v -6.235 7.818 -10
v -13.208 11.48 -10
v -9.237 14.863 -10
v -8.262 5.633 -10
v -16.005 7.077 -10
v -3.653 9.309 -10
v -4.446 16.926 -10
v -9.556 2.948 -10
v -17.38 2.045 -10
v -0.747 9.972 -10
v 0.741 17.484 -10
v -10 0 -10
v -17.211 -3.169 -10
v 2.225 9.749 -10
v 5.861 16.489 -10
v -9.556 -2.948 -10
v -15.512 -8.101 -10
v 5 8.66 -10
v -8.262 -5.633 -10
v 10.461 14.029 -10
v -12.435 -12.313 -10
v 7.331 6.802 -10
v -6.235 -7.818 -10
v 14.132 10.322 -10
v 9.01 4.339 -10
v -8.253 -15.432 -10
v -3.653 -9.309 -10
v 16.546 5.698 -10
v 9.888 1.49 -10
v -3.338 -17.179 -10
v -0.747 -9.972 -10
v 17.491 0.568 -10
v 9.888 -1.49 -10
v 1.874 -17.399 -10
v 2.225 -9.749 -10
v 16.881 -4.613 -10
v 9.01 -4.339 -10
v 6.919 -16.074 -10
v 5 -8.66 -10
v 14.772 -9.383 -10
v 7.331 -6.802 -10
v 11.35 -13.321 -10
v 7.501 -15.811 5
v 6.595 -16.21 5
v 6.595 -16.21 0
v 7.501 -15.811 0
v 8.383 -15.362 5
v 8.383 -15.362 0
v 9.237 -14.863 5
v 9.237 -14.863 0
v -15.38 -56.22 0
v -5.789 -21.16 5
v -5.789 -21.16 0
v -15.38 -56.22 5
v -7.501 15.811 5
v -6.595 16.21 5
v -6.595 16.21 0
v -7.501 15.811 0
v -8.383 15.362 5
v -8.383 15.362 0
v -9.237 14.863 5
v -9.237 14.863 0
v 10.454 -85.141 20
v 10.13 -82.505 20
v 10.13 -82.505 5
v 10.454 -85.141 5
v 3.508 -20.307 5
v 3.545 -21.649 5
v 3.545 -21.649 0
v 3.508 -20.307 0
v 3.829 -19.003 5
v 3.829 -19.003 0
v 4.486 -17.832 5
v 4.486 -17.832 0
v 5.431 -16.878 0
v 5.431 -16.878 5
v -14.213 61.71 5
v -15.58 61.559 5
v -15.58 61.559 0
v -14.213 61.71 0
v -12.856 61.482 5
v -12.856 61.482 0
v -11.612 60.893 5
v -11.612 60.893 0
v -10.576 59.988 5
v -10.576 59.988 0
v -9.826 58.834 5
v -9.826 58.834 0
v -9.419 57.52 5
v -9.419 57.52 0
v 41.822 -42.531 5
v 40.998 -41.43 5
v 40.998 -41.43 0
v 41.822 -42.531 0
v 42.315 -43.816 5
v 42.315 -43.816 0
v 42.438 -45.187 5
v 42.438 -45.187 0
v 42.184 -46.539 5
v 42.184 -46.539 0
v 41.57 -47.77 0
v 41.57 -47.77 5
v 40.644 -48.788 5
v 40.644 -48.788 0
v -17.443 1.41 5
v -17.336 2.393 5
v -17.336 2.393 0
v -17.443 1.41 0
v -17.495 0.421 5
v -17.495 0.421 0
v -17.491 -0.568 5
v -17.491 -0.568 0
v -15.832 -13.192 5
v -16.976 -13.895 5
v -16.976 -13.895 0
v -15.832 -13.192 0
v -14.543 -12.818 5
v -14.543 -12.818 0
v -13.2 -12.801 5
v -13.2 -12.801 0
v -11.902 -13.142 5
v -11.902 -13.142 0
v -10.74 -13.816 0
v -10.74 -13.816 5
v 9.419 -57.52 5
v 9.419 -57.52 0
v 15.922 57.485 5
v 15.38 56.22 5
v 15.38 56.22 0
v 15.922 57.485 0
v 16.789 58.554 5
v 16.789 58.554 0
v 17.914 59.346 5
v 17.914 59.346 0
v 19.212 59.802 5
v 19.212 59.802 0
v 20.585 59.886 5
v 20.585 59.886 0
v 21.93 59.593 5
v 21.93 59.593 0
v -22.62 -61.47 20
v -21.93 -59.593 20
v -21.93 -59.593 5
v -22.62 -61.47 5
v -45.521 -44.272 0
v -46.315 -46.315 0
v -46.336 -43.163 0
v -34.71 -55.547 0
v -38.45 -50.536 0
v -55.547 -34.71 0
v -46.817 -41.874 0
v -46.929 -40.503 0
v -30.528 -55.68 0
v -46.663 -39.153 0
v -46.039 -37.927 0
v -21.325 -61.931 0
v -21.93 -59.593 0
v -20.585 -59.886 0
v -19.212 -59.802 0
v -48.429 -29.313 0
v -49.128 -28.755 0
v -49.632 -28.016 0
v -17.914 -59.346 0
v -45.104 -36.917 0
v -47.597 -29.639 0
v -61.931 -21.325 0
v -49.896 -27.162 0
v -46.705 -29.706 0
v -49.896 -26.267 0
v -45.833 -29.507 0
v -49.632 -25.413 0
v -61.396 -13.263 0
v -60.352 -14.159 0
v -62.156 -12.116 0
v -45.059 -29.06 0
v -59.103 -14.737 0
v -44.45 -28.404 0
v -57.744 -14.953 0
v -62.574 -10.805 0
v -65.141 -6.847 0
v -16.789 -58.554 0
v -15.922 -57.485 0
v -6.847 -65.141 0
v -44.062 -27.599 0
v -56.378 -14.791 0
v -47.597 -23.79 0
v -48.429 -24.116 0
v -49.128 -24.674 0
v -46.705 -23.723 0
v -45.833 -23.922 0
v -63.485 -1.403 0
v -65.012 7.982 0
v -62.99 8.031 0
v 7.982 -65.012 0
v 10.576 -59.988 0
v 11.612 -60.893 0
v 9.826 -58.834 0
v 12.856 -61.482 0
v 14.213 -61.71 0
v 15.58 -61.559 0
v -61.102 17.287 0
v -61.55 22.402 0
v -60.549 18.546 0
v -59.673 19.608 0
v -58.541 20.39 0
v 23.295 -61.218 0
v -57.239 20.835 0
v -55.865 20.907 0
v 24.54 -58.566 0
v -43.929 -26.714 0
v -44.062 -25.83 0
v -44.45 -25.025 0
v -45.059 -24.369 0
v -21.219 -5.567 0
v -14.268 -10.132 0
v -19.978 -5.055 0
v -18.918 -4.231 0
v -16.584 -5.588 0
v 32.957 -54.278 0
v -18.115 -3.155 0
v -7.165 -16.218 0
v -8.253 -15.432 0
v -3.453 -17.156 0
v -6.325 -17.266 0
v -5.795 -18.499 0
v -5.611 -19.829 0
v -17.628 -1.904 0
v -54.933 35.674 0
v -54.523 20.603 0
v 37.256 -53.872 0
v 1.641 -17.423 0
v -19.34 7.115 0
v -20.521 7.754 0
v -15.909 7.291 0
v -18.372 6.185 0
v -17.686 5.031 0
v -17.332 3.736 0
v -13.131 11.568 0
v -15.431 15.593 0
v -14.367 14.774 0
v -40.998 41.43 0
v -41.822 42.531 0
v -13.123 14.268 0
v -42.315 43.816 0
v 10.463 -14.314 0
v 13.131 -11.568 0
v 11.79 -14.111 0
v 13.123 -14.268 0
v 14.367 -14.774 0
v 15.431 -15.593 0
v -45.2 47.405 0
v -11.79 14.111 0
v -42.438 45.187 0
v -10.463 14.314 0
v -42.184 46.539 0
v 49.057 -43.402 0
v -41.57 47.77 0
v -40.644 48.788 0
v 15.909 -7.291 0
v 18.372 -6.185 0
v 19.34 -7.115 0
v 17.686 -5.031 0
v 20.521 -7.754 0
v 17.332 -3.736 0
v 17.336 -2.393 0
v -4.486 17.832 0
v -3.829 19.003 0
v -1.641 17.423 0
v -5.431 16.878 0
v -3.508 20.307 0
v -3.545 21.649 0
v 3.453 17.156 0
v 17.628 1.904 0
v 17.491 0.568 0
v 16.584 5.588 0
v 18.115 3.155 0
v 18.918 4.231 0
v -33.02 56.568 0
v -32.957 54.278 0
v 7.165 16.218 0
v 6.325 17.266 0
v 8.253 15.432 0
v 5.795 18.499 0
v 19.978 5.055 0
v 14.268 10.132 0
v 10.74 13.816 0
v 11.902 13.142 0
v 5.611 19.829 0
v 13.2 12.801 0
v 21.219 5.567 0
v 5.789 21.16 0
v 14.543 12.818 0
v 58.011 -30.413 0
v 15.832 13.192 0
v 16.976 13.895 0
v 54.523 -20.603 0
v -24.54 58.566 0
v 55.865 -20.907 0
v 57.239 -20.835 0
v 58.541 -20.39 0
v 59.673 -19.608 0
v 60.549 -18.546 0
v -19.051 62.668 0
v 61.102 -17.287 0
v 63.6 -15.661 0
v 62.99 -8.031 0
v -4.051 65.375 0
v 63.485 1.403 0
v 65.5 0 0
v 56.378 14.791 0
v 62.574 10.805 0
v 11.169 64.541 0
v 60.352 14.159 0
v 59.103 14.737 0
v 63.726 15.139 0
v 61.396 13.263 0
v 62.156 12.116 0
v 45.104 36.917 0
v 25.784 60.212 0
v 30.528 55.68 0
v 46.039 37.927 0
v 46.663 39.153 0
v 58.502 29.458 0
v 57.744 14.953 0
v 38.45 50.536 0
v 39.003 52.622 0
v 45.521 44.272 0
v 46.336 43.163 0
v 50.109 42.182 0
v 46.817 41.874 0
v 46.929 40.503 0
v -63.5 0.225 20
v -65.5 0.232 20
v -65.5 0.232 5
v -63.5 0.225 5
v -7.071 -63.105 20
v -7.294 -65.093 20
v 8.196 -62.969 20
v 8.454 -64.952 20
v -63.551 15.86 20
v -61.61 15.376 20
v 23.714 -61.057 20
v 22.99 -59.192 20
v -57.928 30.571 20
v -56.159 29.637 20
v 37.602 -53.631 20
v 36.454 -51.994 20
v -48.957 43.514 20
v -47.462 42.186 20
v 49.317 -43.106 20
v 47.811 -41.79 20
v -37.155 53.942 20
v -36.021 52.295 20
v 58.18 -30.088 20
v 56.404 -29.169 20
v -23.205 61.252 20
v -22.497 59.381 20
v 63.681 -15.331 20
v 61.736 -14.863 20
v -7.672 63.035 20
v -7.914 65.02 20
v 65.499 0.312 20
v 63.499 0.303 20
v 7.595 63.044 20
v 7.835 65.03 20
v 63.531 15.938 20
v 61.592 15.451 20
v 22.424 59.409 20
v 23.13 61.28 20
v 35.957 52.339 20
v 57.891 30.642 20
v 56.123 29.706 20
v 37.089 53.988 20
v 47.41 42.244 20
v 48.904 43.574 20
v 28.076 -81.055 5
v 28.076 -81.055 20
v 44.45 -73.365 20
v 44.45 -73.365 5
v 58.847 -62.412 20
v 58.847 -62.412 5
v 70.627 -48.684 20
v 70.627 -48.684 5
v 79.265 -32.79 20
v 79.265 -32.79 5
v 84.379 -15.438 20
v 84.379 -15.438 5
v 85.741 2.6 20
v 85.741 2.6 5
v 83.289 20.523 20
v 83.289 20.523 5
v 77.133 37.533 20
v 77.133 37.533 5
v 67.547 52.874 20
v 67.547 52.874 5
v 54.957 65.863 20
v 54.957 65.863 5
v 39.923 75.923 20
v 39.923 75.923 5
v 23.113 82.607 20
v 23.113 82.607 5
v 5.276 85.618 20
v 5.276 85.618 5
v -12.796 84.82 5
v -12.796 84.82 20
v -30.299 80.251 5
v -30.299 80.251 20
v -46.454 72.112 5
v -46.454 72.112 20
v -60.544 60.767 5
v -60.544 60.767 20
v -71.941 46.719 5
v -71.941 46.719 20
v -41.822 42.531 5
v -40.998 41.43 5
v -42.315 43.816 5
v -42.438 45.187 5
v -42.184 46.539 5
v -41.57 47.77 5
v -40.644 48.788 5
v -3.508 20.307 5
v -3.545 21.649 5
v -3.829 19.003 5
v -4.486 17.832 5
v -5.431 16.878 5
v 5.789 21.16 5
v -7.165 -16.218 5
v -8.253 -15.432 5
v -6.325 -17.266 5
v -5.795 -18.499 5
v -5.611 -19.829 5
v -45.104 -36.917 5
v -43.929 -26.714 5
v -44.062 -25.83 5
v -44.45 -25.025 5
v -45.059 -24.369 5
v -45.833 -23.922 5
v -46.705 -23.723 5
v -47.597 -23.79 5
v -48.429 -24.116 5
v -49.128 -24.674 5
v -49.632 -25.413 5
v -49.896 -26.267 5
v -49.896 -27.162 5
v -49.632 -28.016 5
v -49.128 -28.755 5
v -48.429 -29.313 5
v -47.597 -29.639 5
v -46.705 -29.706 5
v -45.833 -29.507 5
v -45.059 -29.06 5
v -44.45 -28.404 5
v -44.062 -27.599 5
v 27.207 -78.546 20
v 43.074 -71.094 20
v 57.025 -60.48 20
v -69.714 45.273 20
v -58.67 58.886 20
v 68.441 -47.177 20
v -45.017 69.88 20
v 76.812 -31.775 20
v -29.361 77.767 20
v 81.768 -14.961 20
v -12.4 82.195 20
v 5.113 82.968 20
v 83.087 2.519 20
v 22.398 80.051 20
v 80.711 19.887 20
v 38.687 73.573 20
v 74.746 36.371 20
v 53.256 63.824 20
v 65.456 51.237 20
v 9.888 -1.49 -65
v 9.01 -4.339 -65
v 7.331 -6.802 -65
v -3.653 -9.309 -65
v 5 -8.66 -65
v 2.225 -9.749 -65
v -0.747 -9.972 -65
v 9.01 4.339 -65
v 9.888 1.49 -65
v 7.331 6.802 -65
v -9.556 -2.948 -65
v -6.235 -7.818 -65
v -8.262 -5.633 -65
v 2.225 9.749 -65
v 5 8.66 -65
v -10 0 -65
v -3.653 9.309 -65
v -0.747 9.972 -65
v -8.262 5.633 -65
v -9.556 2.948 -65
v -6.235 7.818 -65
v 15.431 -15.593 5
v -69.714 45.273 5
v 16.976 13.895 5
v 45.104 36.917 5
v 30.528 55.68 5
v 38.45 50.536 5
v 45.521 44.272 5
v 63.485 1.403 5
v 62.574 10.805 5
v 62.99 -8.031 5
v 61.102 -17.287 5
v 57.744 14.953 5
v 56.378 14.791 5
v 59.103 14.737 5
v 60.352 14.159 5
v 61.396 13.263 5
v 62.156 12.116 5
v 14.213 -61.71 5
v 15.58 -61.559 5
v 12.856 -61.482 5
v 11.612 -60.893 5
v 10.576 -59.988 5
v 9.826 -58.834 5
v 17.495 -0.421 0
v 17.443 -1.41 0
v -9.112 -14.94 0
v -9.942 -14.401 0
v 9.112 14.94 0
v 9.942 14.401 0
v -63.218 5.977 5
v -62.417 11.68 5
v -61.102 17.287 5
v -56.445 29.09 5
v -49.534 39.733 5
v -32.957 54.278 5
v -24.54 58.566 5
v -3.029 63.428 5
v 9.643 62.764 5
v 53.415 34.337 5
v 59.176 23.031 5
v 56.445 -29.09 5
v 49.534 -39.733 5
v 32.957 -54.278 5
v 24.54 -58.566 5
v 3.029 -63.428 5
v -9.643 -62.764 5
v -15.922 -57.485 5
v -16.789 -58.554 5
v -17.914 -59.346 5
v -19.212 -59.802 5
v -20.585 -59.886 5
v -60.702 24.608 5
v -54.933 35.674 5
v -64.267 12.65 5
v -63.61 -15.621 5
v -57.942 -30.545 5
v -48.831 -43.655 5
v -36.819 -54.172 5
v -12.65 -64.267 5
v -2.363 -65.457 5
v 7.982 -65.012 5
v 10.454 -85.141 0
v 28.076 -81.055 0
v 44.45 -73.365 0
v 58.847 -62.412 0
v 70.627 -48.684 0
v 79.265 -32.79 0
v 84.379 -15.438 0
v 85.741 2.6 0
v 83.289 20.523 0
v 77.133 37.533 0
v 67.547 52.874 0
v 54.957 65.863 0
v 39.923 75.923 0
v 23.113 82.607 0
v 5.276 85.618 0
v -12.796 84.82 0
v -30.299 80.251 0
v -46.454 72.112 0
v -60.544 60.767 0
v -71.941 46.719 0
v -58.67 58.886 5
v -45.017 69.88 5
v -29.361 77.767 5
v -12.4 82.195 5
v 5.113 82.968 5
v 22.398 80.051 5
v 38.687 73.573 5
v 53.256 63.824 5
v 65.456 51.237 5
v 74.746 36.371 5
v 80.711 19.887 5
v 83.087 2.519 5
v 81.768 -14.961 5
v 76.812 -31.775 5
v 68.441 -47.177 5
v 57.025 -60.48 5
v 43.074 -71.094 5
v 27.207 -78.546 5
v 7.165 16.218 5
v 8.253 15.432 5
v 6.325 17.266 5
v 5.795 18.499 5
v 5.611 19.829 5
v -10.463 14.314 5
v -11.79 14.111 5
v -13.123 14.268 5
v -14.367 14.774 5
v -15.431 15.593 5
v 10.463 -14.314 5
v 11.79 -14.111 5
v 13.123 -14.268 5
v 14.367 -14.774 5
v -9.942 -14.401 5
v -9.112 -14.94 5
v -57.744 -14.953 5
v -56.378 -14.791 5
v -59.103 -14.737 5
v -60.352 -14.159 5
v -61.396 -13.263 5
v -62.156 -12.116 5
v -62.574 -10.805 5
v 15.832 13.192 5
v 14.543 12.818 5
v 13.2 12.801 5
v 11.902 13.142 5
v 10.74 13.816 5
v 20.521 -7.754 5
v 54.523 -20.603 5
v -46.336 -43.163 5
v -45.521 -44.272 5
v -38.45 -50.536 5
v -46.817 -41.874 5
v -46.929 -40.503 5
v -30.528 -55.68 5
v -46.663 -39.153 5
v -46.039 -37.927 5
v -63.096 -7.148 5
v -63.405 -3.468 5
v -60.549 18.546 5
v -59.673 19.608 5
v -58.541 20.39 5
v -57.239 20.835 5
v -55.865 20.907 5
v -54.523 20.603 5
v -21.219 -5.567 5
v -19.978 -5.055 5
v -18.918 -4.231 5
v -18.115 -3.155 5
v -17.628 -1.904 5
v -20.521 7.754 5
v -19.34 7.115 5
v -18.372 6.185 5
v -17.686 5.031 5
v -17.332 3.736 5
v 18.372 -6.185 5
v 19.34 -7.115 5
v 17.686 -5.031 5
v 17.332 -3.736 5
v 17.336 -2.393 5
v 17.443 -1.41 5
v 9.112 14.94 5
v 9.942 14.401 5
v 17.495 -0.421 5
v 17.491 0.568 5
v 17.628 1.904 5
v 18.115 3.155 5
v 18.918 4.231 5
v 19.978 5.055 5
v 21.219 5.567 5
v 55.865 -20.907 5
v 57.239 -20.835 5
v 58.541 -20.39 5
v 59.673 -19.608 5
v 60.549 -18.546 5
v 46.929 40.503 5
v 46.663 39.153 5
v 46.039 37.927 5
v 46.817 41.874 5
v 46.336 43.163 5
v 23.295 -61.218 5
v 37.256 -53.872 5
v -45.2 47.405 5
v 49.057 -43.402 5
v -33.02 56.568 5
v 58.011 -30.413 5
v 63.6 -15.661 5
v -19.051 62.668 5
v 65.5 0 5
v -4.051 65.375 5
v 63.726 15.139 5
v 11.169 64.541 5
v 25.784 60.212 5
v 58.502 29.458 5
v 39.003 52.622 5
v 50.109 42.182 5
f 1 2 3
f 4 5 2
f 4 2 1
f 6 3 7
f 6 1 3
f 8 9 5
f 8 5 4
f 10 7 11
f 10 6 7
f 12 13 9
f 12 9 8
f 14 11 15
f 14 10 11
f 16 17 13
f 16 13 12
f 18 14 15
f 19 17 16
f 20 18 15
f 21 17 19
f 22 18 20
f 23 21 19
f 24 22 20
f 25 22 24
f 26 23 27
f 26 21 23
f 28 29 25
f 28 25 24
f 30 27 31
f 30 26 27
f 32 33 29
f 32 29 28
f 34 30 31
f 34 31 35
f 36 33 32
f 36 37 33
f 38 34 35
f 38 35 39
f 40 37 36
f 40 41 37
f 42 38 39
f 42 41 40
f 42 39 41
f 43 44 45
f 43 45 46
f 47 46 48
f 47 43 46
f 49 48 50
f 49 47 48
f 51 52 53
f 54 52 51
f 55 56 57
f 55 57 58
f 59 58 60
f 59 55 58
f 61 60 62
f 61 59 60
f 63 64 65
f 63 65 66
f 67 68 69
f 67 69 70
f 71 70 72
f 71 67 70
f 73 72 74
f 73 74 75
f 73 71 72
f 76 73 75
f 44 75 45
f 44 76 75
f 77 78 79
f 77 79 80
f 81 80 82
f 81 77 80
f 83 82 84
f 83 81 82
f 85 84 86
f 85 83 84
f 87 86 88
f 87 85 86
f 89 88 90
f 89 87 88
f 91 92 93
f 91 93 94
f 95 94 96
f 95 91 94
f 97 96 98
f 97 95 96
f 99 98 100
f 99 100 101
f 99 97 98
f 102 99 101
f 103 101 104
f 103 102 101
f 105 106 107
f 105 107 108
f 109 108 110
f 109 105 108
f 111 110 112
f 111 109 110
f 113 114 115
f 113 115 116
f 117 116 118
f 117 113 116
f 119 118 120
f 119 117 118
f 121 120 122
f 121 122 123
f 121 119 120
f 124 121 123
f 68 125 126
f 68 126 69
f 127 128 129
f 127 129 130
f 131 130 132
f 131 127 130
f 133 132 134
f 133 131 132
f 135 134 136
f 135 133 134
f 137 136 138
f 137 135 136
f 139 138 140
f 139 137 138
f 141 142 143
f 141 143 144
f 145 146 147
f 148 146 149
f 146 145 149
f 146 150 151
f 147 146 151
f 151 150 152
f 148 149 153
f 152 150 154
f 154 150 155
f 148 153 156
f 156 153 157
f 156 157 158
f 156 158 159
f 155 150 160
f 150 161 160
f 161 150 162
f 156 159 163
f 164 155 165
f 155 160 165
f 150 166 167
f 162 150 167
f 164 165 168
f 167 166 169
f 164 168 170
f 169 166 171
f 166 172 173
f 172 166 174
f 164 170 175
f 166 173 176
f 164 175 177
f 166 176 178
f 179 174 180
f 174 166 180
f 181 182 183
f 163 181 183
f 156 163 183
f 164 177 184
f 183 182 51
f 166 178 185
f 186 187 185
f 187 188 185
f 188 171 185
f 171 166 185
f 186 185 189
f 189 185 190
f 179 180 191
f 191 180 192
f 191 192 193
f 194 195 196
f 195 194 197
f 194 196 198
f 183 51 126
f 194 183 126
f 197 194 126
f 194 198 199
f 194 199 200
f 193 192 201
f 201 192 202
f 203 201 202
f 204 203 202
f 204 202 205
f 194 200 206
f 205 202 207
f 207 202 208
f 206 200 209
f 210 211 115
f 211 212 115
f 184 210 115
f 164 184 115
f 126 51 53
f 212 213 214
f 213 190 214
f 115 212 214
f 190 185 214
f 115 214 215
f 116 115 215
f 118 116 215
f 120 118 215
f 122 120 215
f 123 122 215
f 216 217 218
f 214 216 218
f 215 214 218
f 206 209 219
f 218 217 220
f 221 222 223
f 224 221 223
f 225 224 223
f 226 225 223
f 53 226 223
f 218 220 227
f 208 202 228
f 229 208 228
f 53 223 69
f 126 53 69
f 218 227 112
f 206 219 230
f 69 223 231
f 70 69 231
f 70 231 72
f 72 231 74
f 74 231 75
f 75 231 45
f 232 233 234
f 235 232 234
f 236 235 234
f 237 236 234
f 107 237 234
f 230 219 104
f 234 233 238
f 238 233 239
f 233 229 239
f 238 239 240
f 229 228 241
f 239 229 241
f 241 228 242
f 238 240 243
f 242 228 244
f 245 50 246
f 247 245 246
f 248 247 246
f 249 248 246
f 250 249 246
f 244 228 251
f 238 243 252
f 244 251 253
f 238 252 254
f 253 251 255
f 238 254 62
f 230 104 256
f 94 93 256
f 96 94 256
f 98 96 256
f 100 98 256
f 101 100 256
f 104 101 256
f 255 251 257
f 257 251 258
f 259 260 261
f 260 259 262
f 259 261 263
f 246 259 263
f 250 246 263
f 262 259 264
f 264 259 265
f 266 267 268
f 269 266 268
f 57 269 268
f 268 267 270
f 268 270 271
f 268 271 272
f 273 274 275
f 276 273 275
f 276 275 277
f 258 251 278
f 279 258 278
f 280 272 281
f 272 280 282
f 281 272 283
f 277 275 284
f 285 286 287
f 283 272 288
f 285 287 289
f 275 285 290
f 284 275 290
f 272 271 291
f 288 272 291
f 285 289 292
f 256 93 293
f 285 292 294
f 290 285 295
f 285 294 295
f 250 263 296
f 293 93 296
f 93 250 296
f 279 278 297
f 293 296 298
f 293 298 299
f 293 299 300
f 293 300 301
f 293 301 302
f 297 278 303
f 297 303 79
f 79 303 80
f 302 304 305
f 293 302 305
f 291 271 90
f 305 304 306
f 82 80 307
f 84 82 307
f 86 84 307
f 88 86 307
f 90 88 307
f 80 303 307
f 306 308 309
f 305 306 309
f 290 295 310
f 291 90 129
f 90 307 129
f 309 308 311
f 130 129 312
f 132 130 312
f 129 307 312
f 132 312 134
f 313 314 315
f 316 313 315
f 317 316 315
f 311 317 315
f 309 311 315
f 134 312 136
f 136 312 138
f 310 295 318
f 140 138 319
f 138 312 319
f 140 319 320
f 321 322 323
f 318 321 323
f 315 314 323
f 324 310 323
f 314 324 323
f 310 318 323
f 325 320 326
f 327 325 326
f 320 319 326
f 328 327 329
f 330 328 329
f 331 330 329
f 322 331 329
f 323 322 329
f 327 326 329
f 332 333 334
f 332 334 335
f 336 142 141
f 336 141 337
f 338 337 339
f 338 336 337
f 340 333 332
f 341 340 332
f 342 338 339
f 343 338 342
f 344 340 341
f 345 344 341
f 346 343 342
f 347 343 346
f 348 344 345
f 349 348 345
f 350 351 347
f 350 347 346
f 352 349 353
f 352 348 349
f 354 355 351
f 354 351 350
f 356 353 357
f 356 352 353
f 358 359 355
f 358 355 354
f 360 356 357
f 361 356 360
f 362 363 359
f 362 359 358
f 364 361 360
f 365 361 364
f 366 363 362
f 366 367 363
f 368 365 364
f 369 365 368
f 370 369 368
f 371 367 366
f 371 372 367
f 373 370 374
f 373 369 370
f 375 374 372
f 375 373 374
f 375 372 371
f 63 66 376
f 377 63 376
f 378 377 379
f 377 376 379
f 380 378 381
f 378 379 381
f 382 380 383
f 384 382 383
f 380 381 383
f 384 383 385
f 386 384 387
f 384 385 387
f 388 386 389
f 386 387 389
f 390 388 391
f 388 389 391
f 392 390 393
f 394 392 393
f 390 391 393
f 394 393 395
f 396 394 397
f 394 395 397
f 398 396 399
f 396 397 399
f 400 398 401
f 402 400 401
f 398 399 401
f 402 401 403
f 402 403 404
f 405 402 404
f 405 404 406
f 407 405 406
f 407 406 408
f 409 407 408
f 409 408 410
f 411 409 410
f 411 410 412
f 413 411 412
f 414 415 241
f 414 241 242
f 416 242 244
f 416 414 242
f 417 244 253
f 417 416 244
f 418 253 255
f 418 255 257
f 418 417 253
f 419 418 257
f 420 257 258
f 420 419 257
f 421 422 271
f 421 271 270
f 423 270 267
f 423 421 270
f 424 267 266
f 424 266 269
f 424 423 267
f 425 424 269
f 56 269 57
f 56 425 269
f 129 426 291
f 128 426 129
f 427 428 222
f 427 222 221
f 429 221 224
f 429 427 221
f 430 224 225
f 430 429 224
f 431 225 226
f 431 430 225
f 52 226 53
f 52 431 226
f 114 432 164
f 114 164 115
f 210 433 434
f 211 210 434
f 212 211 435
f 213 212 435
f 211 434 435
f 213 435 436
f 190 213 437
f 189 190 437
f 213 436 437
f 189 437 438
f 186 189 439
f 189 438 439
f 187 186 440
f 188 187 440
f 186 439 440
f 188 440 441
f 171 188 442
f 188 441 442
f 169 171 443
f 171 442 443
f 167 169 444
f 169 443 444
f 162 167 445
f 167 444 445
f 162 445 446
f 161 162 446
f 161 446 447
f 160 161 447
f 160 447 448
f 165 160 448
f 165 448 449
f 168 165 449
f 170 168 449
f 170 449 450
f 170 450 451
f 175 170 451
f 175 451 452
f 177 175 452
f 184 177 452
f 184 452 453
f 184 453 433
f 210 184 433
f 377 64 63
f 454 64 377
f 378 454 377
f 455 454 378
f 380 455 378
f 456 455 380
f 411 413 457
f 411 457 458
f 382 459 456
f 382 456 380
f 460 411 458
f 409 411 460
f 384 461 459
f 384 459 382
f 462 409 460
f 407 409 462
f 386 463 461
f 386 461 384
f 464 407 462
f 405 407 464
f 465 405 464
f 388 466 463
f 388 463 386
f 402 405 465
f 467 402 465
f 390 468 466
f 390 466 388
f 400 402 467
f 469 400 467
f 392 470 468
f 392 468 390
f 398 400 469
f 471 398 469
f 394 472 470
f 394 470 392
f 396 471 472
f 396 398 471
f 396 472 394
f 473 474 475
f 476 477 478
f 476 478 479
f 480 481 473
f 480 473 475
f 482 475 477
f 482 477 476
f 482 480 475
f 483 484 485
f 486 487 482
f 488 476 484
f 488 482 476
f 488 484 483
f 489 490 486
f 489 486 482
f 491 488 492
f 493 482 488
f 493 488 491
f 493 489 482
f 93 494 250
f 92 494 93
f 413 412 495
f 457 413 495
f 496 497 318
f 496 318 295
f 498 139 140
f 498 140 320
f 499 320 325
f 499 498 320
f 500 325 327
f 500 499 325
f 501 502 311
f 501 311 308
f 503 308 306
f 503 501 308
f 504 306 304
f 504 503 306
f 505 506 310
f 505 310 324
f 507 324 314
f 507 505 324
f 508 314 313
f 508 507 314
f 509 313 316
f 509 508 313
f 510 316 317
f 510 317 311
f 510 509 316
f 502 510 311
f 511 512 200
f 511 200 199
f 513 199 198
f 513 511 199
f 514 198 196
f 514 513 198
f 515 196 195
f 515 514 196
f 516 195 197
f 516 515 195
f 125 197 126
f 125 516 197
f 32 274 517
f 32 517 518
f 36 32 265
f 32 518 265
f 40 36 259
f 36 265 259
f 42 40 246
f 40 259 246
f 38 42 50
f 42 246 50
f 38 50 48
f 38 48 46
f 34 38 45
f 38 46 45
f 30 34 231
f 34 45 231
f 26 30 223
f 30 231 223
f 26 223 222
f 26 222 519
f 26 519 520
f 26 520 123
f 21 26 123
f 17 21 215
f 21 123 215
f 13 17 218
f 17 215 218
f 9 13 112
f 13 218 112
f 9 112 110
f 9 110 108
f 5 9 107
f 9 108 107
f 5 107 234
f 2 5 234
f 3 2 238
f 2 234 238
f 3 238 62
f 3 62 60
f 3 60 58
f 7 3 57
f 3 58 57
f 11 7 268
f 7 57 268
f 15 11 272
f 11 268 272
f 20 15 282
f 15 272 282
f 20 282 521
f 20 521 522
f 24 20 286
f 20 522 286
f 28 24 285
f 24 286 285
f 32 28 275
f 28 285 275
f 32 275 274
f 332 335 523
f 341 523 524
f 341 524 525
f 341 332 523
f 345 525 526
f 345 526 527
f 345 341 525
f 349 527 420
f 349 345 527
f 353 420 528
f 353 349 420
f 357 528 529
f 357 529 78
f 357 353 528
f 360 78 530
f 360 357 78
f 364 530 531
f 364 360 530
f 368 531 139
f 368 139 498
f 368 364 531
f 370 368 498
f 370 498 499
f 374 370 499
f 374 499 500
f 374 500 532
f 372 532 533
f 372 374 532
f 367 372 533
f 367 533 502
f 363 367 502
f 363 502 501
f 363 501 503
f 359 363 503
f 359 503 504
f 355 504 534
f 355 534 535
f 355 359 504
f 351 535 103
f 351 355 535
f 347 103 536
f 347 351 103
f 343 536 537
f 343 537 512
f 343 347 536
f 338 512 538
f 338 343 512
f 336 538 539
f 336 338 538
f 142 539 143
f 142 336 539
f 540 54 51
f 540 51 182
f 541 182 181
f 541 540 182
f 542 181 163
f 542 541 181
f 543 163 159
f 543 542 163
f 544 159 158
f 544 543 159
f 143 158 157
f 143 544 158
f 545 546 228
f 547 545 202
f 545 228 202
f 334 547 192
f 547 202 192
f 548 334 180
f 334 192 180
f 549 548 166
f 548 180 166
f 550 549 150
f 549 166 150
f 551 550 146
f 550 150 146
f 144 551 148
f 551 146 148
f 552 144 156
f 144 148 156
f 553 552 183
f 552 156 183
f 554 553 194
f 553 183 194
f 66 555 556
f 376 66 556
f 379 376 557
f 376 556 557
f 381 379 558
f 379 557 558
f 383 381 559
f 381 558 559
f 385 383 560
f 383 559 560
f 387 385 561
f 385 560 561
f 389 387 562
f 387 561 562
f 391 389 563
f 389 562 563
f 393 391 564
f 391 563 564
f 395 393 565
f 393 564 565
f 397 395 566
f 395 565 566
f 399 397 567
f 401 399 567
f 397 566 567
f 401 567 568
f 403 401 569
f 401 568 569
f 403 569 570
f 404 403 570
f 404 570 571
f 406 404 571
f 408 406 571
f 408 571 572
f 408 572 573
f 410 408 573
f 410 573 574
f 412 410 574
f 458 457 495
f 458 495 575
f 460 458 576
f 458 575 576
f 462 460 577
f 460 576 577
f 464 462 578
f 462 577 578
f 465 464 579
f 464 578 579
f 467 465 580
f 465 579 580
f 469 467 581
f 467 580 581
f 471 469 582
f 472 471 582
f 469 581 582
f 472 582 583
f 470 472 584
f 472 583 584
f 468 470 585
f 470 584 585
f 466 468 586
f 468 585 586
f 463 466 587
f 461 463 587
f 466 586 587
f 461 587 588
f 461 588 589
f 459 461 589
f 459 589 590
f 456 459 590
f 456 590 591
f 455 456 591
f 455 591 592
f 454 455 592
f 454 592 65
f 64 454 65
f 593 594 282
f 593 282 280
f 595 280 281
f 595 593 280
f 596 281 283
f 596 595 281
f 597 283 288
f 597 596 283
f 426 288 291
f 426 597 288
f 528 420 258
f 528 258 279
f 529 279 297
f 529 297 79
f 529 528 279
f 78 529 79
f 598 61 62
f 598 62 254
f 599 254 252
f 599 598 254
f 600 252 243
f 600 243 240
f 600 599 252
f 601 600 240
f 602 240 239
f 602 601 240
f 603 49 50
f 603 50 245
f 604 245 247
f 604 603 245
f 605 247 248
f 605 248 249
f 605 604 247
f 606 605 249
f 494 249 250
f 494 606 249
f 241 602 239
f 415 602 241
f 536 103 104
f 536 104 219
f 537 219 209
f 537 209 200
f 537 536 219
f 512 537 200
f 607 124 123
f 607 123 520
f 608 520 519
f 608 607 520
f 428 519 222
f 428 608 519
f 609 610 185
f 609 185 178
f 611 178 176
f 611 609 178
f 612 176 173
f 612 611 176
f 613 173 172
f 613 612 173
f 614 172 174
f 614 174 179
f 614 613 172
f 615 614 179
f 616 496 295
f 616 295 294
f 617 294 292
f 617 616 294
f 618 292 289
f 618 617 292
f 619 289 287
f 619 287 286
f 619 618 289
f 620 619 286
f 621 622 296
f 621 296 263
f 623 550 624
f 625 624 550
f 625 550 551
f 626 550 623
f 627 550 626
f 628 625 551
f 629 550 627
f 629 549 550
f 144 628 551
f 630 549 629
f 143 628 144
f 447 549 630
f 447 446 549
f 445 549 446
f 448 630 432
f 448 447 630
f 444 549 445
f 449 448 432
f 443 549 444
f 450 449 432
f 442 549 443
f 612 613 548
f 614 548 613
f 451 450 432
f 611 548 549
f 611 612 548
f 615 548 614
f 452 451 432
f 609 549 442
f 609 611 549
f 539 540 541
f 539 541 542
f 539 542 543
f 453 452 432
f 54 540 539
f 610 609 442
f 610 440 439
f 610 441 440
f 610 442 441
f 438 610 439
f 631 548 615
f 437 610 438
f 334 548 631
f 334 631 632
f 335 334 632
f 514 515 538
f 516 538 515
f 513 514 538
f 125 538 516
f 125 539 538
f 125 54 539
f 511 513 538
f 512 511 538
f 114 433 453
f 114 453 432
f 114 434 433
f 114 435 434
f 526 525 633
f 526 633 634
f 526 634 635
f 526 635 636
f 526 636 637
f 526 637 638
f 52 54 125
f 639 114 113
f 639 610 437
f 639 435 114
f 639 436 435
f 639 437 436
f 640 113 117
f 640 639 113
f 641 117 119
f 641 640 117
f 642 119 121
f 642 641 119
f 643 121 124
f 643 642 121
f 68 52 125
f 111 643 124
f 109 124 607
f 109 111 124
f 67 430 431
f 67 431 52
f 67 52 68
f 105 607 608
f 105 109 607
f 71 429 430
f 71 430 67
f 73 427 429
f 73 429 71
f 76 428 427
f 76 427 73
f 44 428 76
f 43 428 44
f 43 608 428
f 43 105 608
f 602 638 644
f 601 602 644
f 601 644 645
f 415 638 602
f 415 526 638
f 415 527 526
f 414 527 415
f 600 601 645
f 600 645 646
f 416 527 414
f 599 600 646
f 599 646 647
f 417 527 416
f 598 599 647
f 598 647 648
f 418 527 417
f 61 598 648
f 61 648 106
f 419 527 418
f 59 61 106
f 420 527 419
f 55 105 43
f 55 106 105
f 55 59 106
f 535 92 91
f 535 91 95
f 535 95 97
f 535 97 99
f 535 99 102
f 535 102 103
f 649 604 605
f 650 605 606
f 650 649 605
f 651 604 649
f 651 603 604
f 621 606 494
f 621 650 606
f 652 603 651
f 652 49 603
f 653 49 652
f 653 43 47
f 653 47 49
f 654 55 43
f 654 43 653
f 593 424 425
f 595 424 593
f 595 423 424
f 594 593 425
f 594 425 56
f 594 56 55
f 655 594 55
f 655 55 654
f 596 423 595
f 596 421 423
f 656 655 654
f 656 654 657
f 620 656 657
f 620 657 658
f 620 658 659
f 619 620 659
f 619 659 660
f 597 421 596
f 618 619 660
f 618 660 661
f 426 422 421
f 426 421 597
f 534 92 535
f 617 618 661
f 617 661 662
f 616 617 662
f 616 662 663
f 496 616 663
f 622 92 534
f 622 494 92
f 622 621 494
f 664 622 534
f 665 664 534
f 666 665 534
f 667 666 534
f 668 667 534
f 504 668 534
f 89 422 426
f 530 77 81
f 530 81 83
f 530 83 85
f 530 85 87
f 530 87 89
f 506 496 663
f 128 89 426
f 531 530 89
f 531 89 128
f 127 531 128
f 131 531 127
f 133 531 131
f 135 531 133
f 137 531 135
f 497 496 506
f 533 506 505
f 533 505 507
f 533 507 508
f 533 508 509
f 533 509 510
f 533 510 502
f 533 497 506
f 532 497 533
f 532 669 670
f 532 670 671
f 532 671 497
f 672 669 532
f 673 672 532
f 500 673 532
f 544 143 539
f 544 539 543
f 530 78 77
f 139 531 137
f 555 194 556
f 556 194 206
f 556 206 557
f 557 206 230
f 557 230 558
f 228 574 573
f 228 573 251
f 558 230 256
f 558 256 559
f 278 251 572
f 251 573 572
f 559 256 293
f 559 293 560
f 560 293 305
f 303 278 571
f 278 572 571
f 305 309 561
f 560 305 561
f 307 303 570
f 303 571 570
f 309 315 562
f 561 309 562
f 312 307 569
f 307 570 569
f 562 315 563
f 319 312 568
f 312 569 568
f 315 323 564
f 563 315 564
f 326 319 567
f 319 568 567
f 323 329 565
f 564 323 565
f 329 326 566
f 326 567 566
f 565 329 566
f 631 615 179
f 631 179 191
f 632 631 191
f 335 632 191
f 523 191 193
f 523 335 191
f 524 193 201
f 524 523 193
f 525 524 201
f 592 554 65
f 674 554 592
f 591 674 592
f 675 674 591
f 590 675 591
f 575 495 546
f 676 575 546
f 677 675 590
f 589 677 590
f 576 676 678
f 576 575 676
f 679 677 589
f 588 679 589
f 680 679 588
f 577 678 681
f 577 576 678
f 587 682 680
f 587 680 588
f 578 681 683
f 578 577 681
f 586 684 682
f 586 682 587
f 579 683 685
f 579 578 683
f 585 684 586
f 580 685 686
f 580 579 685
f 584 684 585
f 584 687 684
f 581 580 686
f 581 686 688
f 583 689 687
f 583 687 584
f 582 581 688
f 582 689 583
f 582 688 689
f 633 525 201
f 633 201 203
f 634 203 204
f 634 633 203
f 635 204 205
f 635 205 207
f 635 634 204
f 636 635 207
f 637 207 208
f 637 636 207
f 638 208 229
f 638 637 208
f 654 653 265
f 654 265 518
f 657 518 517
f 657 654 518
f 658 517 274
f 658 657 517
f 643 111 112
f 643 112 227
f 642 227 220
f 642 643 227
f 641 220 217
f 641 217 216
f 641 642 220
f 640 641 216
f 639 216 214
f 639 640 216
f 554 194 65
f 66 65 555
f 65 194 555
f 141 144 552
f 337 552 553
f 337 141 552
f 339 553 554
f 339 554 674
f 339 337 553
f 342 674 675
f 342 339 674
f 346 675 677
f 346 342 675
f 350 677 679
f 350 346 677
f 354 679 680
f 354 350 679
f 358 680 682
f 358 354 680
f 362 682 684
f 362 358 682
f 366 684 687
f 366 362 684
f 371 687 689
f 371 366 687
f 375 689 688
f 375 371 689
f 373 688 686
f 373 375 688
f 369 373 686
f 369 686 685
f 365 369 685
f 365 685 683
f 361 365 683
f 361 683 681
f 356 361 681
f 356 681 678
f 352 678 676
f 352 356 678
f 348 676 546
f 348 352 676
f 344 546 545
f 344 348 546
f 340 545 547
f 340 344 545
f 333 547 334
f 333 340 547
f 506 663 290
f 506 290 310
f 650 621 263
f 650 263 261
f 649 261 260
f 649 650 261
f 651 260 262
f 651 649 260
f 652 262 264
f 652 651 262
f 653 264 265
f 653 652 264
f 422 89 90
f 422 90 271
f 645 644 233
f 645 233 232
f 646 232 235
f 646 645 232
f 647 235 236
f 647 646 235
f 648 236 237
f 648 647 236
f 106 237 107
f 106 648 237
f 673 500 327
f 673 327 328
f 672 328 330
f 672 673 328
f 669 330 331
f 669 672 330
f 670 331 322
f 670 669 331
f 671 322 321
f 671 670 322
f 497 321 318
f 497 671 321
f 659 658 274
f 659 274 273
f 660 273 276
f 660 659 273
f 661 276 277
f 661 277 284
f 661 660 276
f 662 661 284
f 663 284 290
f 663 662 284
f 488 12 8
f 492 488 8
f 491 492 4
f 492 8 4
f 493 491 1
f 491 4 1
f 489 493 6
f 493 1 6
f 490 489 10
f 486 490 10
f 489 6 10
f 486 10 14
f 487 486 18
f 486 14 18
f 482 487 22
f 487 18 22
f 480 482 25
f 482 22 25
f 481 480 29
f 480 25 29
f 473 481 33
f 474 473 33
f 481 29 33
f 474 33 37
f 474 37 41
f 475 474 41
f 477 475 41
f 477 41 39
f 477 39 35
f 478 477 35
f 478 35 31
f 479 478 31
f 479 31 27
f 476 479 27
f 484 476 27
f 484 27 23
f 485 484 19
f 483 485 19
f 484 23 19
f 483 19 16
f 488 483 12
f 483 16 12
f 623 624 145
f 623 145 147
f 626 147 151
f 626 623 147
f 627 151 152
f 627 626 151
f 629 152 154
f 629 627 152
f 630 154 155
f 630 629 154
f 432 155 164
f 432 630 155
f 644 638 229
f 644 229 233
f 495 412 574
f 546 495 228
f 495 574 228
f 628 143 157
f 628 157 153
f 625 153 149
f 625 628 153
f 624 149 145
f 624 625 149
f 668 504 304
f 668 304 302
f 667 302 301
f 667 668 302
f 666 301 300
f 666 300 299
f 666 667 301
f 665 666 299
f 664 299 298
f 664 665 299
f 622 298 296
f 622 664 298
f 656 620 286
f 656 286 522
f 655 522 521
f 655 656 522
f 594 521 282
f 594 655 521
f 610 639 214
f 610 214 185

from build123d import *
from build123d.topology import SkipClean

# Parameters (mm, degrees)
SCHIZZO2_R                   = 65.5
ESTRUSIONE_ESTRUSIONE1_DEPTH = 5
TAGLIO_ESTRUSIONE1_DEPTH     = 5
ESTRUSIONE_ESTRUSIONE2_START = 15
ESTRUSIONE_ESTRUSIONE2_DEPTH = 15
ESTRUSIONE_ESTRUSIONE3_DEPTH = 5
ESTRUSIONE_ESTRUSIONE4_DEPTH = 15
SCHIZZO7_R                   = 17.5
ESTRUSIONE_ESTRUSIONE5_DEPTH = 10
SCHIZZO8_R                   = 10
ESTRUSIONE_ESTRUSIONE6_DEPTH = 55
SCHIZZO9_R                   = 3
TAGLIO_ESTRUSIONE2_DEPTH     = 141.058619156


with BuildPart() as part:
    # Schizzo2 → Estrusione-Estrusione1 (new body)
    with BuildSketch(Plane.XY):
        Circle(SCHIZZO2_R)
    extrude(amount=ESTRUSIONE_ESTRUSIONE1_DEPTH)

    # Schizzo3 → Taglio-Estrusione1 (cut)
    with BuildSketch(Plane.XY.offset(5)):
        with BuildLine():
            ThreePointArc((-15.580303655, 61.558948481), (-11.6121535, 60.893291099), (-9.419229509, 57.519806288))
            Line((-9.419229509, 57.519806288), (-3.545169438, 21.649059417))
            ThreePointArc((-3.545169438, 21.649059417), (-4.118256573, 18.395634586), (-6.595126238, 16.20969802))
            ThreePointArc((-6.595126238, 16.20969802), (-7.944833745, 15.592614173), (-9.237403233, 14.863390647))
            ThreePointArc((-9.237403233, 14.863390647), (-12.461730523, 14.144422271), (-15.430658669, 15.593100175))
            Line((-15.430658669, 15.593100175), (-40.998016607, 41.429610598))
            ThreePointArc((-40.998016607, 41.429610598), (-42.438254768, 45.186607995), (-40.644362762, 48.788172498))
            ThreePointArc((-40.644362762, 48.788172498), (-28.828396733, 56.578914286), (-15.580303655, 61.558948481))
        make_face()
        with BuildLine():
            ThreePointArc((10.740447155, 13.816395873), (9.531183113, 14.676734939), (8.25337227, 15.431521188))
            ThreePointArc((8.25337227, 15.431521188), (6.018563747, 17.864386344), (5.788691541, 21.159892491))
            Line((5.788691541, 21.159892491), (15.380086943, 56.220129185))
            ThreePointArc((15.380086943, 56.220129185), (17.91362305, 59.345910719), (21.929615406, 59.593136921))
            ThreePointArc((21.929615406, 59.593136921), (34.584578723, 53.255581065), (45.521461387, 44.272413004))
            ThreePointArc((45.521461387, 44.272413004), (46.929060262, 40.503065473), (45.103998712, 36.917195183))
            Line((45.103998712, 36.917195183), (16.976050705, 13.894736502))
            ThreePointArc((16.976050705, 13.894736502), (13.871958583, 12.764332104), (10.740447155, 13.816395873))
        make_face()
        with BuildLine():
            ThreePointArc((17.335573392, -2.393302147), (17.476016858, -0.915879234), (17.490775503, 0.568130541))
            ThreePointArc((17.490775503, 0.568130541), (18.48029427, 3.719964073), (21.219350209, 5.566792317))
            Line((21.219350209, 5.566792317), (56.37810355, 14.790518587))
            ThreePointArc((56.37810355, 14.790518587), (60.351877818, 14.159302724), (62.573978168, 10.804964424))
            ThreePointArc((62.573978168, 10.804964424), (63.412975457, -3.323333221), (61.101765042, -17.286535477))
            ThreePointArc((61.101765042, -17.286535477), (58.541213762, -20.390225626), (54.523228221, -20.602611105))
            Line((54.523228221, -20.602611105), (20.521220142, -7.754322915))
            ThreePointArc((20.521220142, -7.754322915), (17.990215156, -5.631302481), (17.335573392, -2.393302147))
        make_face()
        with BuildLine():
            ThreePointArc((6.595126238, -16.20969802), (7.944833745, -15.592614173), (9.237403233, -14.863390647))
            ThreePointArc((9.237403233, -14.863390647), (12.461730523, -14.144422271), (15.430658669, -15.593100175))
            Line((15.430658669, -15.593100175), (40.998016607, -41.429610598))
            ThreePointArc((40.998016607, -41.429610598), (42.438254768, -45.186607995), (40.644362762, -48.788172498))
            ThreePointArc((40.644362762, -48.788172498), (28.828396733, -56.578914286), (15.580303655, -61.558948481))
            ThreePointArc((15.580303655, -61.558948481), (11.6121535, -60.893291099), (9.419229509, -57.519806288))
            Line((9.419229509, -57.519806288), (3.545169438, -21.649059417))
            ThreePointArc((3.545169438, -21.649059417), (4.118256573, -18.395634586), (6.595126238, -16.20969802))
        make_face()
        with BuildLine():
            ThreePointArc((-10.740447155, -13.816395873), (-9.531183113, -14.676734939), (-8.25337227, -15.431521188))
            ThreePointArc((-8.25337227, -15.431521188), (-6.018563747, -17.864386344), (-5.788691541, -21.159892491))
            Line((-5.788691541, -21.159892491), (-15.380086943, -56.220129185))
            ThreePointArc((-15.380086943, -56.220129185), (-17.91362305, -59.345910719), (-21.929615406, -59.593136921))
            ThreePointArc((-21.929615406, -59.593136921), (-34.584578723, -53.255581065), (-45.521461387, -44.272413004))
            ThreePointArc((-45.521461387, -44.272413004), (-46.929060262, -40.503065473), (-45.103998712, -36.917195183))
            Line((-45.103998712, -36.917195183), (-16.976050705, -13.894736502))
            ThreePointArc((-16.976050705, -13.894736502), (-13.871958583, -12.764332104), (-10.740447155, -13.816395873))
        make_face()
        with BuildLine():
            ThreePointArc((-17.335573392, 2.393302147), (-17.476016858, 0.915879234), (-17.490775503, -0.568130541))
            ThreePointArc((-17.490775503, -0.568130541), (-18.48029427, -3.719964073), (-21.219350209, -5.566792317))
            Line((-21.219350209, -5.566792317), (-56.37810355, -14.790518587))
            ThreePointArc((-56.37810355, -14.790518587), (-60.351877818, -14.159302724), (-62.573978168, -10.804964424))
            ThreePointArc((-62.573978168, -10.804964424), (-63.412975457, 3.323333221), (-61.101765042, 17.286535477))
            ThreePointArc((-61.101765042, 17.286535477), (-58.541213762, 20.390225626), (-54.523228221, 20.602611105))
            Line((-54.523228221, 20.602611105), (-20.521220142, 7.754322915))
            ThreePointArc((-20.521220142, 7.754322915), (-17.990215156, 5.631302481), (-17.335573392, 2.393302147))
        make_face()
    extrude(amount=-TAGLIO_ESTRUSIONE1_DEPTH, mode=Mode.SUBTRACT)

    # Schizzo4 → Estrusione-Estrusione2 (add)
    with SkipClean():  # the faces are left unmerged after this step: merging them gives an invalid solid
        with BuildSketch(Plane.XY.offset(5).offset(ESTRUSIONE_ESTRUSIONE2_START)):
            with BuildLine():
                Line((-65.499588659, 0.23213256), (-63.499601219, 0.225044543))
                ThreePointArc((-63.499601219, 0.225044543), (52.144908397, 36.23752928), (-21.929615406, -59.593136921))
                Line((-21.929615406, -59.593136921), (-22.620311954, -61.470086116))
                ThreePointArc((-22.620311954, -61.470086116), (53.787267716, 37.378868785), (-65.499588659, 0.23213256))
            make_face()
        extrude(amount=-ESTRUSIONE_ESTRUSIONE2_DEPTH)

    # Schizzo5 → Estrusione-Estrusione3 (add)
    with SkipClean():  # the faces are left unmerged after this step: merging them gives an invalid solid
        with BuildSketch(Plane.XY):
            with BuildLine():
                Line((-71.941161318, 46.719136424), (-54.9329222, 35.673856793))
                ThreePointArc((-54.9329222, 35.673856793), (55.547150298, 34.709711807), (7.982441993, -65.011772933))
                Line((7.982441993, -65.011772933), (10.453952277, -85.140608888))
                ThreePointArc((10.453952277, -85.140608888), (72.745565688, 45.456474486), (-71.941161318, 46.719136424))
            make_face()
        extrude(amount=ESTRUSIONE_ESTRUSIONE3_DEPTH)

    # Schizzo6 → Estrusione-Estrusione4 (add)
    with SkipClean():  # the faces are left unmerged after this step: merging them gives an invalid solid
        with BuildSketch(Plane.XY.offset(5)):
            with BuildLine():
                Line((-71.941161318, 46.719136424), (-69.71449096, 45.273119786))
                ThreePointArc((-69.71449096, 45.273119786), (70.493997993, 44.049538839), (10.130389171, -82.505398855))
                Line((10.130389171, -82.505398855), (10.453952277, -85.140608888))
                ThreePointArc((10.453952277, -85.140608888), (72.745565688, 45.456474486), (-71.941161318, 46.719136424))
            make_face()
        extrude(amount=ESTRUSIONE_ESTRUSIONE4_DEPTH)

    # Schizzo7 → Estrusione-Estrusione5 (add)
    with SkipClean():  # the faces are left unmerged after this step: merging them gives an invalid solid
        with BuildSketch(Plane(origin=(0, 0, 0), x_dir=(-1, 0, 0), z_dir=(0, 0, -1))):
            with Locations(Location((0, 0, 0), (0, 0, 178.139588407))):
                Circle(SCHIZZO7_R)
        extrude(amount=ESTRUSIONE_ESTRUSIONE5_DEPTH)

    # Schizzo8 → Estrusione-Estrusione6 (add)
    with SkipClean():  # the faces are left unmerged after this step: merging them gives an invalid solid
        with BuildSketch(Plane(origin=(0, 0, -10), x_dir=(-1, 0, 0), z_dir=(0, 0, -1))):
            Circle(SCHIZZO8_R)
        extrude(amount=ESTRUSIONE_ESTRUSIONE6_DEPTH)

    # Schizzo9 → Taglio-Estrusione2 (cut, through all)
    with SkipClean():  # the faces are left unmerged after this step: merging them gives an invalid solid
        with BuildSketch(Plane.XY.offset(5)):
            with Locations((-46.929060262, -26.714477403)):
                Circle(SCHIZZO9_R)
        extrude(amount=-TAGLIO_ESTRUSIONE2_DEPTH, mode=Mode.SUBTRACT)


solid = part.part
